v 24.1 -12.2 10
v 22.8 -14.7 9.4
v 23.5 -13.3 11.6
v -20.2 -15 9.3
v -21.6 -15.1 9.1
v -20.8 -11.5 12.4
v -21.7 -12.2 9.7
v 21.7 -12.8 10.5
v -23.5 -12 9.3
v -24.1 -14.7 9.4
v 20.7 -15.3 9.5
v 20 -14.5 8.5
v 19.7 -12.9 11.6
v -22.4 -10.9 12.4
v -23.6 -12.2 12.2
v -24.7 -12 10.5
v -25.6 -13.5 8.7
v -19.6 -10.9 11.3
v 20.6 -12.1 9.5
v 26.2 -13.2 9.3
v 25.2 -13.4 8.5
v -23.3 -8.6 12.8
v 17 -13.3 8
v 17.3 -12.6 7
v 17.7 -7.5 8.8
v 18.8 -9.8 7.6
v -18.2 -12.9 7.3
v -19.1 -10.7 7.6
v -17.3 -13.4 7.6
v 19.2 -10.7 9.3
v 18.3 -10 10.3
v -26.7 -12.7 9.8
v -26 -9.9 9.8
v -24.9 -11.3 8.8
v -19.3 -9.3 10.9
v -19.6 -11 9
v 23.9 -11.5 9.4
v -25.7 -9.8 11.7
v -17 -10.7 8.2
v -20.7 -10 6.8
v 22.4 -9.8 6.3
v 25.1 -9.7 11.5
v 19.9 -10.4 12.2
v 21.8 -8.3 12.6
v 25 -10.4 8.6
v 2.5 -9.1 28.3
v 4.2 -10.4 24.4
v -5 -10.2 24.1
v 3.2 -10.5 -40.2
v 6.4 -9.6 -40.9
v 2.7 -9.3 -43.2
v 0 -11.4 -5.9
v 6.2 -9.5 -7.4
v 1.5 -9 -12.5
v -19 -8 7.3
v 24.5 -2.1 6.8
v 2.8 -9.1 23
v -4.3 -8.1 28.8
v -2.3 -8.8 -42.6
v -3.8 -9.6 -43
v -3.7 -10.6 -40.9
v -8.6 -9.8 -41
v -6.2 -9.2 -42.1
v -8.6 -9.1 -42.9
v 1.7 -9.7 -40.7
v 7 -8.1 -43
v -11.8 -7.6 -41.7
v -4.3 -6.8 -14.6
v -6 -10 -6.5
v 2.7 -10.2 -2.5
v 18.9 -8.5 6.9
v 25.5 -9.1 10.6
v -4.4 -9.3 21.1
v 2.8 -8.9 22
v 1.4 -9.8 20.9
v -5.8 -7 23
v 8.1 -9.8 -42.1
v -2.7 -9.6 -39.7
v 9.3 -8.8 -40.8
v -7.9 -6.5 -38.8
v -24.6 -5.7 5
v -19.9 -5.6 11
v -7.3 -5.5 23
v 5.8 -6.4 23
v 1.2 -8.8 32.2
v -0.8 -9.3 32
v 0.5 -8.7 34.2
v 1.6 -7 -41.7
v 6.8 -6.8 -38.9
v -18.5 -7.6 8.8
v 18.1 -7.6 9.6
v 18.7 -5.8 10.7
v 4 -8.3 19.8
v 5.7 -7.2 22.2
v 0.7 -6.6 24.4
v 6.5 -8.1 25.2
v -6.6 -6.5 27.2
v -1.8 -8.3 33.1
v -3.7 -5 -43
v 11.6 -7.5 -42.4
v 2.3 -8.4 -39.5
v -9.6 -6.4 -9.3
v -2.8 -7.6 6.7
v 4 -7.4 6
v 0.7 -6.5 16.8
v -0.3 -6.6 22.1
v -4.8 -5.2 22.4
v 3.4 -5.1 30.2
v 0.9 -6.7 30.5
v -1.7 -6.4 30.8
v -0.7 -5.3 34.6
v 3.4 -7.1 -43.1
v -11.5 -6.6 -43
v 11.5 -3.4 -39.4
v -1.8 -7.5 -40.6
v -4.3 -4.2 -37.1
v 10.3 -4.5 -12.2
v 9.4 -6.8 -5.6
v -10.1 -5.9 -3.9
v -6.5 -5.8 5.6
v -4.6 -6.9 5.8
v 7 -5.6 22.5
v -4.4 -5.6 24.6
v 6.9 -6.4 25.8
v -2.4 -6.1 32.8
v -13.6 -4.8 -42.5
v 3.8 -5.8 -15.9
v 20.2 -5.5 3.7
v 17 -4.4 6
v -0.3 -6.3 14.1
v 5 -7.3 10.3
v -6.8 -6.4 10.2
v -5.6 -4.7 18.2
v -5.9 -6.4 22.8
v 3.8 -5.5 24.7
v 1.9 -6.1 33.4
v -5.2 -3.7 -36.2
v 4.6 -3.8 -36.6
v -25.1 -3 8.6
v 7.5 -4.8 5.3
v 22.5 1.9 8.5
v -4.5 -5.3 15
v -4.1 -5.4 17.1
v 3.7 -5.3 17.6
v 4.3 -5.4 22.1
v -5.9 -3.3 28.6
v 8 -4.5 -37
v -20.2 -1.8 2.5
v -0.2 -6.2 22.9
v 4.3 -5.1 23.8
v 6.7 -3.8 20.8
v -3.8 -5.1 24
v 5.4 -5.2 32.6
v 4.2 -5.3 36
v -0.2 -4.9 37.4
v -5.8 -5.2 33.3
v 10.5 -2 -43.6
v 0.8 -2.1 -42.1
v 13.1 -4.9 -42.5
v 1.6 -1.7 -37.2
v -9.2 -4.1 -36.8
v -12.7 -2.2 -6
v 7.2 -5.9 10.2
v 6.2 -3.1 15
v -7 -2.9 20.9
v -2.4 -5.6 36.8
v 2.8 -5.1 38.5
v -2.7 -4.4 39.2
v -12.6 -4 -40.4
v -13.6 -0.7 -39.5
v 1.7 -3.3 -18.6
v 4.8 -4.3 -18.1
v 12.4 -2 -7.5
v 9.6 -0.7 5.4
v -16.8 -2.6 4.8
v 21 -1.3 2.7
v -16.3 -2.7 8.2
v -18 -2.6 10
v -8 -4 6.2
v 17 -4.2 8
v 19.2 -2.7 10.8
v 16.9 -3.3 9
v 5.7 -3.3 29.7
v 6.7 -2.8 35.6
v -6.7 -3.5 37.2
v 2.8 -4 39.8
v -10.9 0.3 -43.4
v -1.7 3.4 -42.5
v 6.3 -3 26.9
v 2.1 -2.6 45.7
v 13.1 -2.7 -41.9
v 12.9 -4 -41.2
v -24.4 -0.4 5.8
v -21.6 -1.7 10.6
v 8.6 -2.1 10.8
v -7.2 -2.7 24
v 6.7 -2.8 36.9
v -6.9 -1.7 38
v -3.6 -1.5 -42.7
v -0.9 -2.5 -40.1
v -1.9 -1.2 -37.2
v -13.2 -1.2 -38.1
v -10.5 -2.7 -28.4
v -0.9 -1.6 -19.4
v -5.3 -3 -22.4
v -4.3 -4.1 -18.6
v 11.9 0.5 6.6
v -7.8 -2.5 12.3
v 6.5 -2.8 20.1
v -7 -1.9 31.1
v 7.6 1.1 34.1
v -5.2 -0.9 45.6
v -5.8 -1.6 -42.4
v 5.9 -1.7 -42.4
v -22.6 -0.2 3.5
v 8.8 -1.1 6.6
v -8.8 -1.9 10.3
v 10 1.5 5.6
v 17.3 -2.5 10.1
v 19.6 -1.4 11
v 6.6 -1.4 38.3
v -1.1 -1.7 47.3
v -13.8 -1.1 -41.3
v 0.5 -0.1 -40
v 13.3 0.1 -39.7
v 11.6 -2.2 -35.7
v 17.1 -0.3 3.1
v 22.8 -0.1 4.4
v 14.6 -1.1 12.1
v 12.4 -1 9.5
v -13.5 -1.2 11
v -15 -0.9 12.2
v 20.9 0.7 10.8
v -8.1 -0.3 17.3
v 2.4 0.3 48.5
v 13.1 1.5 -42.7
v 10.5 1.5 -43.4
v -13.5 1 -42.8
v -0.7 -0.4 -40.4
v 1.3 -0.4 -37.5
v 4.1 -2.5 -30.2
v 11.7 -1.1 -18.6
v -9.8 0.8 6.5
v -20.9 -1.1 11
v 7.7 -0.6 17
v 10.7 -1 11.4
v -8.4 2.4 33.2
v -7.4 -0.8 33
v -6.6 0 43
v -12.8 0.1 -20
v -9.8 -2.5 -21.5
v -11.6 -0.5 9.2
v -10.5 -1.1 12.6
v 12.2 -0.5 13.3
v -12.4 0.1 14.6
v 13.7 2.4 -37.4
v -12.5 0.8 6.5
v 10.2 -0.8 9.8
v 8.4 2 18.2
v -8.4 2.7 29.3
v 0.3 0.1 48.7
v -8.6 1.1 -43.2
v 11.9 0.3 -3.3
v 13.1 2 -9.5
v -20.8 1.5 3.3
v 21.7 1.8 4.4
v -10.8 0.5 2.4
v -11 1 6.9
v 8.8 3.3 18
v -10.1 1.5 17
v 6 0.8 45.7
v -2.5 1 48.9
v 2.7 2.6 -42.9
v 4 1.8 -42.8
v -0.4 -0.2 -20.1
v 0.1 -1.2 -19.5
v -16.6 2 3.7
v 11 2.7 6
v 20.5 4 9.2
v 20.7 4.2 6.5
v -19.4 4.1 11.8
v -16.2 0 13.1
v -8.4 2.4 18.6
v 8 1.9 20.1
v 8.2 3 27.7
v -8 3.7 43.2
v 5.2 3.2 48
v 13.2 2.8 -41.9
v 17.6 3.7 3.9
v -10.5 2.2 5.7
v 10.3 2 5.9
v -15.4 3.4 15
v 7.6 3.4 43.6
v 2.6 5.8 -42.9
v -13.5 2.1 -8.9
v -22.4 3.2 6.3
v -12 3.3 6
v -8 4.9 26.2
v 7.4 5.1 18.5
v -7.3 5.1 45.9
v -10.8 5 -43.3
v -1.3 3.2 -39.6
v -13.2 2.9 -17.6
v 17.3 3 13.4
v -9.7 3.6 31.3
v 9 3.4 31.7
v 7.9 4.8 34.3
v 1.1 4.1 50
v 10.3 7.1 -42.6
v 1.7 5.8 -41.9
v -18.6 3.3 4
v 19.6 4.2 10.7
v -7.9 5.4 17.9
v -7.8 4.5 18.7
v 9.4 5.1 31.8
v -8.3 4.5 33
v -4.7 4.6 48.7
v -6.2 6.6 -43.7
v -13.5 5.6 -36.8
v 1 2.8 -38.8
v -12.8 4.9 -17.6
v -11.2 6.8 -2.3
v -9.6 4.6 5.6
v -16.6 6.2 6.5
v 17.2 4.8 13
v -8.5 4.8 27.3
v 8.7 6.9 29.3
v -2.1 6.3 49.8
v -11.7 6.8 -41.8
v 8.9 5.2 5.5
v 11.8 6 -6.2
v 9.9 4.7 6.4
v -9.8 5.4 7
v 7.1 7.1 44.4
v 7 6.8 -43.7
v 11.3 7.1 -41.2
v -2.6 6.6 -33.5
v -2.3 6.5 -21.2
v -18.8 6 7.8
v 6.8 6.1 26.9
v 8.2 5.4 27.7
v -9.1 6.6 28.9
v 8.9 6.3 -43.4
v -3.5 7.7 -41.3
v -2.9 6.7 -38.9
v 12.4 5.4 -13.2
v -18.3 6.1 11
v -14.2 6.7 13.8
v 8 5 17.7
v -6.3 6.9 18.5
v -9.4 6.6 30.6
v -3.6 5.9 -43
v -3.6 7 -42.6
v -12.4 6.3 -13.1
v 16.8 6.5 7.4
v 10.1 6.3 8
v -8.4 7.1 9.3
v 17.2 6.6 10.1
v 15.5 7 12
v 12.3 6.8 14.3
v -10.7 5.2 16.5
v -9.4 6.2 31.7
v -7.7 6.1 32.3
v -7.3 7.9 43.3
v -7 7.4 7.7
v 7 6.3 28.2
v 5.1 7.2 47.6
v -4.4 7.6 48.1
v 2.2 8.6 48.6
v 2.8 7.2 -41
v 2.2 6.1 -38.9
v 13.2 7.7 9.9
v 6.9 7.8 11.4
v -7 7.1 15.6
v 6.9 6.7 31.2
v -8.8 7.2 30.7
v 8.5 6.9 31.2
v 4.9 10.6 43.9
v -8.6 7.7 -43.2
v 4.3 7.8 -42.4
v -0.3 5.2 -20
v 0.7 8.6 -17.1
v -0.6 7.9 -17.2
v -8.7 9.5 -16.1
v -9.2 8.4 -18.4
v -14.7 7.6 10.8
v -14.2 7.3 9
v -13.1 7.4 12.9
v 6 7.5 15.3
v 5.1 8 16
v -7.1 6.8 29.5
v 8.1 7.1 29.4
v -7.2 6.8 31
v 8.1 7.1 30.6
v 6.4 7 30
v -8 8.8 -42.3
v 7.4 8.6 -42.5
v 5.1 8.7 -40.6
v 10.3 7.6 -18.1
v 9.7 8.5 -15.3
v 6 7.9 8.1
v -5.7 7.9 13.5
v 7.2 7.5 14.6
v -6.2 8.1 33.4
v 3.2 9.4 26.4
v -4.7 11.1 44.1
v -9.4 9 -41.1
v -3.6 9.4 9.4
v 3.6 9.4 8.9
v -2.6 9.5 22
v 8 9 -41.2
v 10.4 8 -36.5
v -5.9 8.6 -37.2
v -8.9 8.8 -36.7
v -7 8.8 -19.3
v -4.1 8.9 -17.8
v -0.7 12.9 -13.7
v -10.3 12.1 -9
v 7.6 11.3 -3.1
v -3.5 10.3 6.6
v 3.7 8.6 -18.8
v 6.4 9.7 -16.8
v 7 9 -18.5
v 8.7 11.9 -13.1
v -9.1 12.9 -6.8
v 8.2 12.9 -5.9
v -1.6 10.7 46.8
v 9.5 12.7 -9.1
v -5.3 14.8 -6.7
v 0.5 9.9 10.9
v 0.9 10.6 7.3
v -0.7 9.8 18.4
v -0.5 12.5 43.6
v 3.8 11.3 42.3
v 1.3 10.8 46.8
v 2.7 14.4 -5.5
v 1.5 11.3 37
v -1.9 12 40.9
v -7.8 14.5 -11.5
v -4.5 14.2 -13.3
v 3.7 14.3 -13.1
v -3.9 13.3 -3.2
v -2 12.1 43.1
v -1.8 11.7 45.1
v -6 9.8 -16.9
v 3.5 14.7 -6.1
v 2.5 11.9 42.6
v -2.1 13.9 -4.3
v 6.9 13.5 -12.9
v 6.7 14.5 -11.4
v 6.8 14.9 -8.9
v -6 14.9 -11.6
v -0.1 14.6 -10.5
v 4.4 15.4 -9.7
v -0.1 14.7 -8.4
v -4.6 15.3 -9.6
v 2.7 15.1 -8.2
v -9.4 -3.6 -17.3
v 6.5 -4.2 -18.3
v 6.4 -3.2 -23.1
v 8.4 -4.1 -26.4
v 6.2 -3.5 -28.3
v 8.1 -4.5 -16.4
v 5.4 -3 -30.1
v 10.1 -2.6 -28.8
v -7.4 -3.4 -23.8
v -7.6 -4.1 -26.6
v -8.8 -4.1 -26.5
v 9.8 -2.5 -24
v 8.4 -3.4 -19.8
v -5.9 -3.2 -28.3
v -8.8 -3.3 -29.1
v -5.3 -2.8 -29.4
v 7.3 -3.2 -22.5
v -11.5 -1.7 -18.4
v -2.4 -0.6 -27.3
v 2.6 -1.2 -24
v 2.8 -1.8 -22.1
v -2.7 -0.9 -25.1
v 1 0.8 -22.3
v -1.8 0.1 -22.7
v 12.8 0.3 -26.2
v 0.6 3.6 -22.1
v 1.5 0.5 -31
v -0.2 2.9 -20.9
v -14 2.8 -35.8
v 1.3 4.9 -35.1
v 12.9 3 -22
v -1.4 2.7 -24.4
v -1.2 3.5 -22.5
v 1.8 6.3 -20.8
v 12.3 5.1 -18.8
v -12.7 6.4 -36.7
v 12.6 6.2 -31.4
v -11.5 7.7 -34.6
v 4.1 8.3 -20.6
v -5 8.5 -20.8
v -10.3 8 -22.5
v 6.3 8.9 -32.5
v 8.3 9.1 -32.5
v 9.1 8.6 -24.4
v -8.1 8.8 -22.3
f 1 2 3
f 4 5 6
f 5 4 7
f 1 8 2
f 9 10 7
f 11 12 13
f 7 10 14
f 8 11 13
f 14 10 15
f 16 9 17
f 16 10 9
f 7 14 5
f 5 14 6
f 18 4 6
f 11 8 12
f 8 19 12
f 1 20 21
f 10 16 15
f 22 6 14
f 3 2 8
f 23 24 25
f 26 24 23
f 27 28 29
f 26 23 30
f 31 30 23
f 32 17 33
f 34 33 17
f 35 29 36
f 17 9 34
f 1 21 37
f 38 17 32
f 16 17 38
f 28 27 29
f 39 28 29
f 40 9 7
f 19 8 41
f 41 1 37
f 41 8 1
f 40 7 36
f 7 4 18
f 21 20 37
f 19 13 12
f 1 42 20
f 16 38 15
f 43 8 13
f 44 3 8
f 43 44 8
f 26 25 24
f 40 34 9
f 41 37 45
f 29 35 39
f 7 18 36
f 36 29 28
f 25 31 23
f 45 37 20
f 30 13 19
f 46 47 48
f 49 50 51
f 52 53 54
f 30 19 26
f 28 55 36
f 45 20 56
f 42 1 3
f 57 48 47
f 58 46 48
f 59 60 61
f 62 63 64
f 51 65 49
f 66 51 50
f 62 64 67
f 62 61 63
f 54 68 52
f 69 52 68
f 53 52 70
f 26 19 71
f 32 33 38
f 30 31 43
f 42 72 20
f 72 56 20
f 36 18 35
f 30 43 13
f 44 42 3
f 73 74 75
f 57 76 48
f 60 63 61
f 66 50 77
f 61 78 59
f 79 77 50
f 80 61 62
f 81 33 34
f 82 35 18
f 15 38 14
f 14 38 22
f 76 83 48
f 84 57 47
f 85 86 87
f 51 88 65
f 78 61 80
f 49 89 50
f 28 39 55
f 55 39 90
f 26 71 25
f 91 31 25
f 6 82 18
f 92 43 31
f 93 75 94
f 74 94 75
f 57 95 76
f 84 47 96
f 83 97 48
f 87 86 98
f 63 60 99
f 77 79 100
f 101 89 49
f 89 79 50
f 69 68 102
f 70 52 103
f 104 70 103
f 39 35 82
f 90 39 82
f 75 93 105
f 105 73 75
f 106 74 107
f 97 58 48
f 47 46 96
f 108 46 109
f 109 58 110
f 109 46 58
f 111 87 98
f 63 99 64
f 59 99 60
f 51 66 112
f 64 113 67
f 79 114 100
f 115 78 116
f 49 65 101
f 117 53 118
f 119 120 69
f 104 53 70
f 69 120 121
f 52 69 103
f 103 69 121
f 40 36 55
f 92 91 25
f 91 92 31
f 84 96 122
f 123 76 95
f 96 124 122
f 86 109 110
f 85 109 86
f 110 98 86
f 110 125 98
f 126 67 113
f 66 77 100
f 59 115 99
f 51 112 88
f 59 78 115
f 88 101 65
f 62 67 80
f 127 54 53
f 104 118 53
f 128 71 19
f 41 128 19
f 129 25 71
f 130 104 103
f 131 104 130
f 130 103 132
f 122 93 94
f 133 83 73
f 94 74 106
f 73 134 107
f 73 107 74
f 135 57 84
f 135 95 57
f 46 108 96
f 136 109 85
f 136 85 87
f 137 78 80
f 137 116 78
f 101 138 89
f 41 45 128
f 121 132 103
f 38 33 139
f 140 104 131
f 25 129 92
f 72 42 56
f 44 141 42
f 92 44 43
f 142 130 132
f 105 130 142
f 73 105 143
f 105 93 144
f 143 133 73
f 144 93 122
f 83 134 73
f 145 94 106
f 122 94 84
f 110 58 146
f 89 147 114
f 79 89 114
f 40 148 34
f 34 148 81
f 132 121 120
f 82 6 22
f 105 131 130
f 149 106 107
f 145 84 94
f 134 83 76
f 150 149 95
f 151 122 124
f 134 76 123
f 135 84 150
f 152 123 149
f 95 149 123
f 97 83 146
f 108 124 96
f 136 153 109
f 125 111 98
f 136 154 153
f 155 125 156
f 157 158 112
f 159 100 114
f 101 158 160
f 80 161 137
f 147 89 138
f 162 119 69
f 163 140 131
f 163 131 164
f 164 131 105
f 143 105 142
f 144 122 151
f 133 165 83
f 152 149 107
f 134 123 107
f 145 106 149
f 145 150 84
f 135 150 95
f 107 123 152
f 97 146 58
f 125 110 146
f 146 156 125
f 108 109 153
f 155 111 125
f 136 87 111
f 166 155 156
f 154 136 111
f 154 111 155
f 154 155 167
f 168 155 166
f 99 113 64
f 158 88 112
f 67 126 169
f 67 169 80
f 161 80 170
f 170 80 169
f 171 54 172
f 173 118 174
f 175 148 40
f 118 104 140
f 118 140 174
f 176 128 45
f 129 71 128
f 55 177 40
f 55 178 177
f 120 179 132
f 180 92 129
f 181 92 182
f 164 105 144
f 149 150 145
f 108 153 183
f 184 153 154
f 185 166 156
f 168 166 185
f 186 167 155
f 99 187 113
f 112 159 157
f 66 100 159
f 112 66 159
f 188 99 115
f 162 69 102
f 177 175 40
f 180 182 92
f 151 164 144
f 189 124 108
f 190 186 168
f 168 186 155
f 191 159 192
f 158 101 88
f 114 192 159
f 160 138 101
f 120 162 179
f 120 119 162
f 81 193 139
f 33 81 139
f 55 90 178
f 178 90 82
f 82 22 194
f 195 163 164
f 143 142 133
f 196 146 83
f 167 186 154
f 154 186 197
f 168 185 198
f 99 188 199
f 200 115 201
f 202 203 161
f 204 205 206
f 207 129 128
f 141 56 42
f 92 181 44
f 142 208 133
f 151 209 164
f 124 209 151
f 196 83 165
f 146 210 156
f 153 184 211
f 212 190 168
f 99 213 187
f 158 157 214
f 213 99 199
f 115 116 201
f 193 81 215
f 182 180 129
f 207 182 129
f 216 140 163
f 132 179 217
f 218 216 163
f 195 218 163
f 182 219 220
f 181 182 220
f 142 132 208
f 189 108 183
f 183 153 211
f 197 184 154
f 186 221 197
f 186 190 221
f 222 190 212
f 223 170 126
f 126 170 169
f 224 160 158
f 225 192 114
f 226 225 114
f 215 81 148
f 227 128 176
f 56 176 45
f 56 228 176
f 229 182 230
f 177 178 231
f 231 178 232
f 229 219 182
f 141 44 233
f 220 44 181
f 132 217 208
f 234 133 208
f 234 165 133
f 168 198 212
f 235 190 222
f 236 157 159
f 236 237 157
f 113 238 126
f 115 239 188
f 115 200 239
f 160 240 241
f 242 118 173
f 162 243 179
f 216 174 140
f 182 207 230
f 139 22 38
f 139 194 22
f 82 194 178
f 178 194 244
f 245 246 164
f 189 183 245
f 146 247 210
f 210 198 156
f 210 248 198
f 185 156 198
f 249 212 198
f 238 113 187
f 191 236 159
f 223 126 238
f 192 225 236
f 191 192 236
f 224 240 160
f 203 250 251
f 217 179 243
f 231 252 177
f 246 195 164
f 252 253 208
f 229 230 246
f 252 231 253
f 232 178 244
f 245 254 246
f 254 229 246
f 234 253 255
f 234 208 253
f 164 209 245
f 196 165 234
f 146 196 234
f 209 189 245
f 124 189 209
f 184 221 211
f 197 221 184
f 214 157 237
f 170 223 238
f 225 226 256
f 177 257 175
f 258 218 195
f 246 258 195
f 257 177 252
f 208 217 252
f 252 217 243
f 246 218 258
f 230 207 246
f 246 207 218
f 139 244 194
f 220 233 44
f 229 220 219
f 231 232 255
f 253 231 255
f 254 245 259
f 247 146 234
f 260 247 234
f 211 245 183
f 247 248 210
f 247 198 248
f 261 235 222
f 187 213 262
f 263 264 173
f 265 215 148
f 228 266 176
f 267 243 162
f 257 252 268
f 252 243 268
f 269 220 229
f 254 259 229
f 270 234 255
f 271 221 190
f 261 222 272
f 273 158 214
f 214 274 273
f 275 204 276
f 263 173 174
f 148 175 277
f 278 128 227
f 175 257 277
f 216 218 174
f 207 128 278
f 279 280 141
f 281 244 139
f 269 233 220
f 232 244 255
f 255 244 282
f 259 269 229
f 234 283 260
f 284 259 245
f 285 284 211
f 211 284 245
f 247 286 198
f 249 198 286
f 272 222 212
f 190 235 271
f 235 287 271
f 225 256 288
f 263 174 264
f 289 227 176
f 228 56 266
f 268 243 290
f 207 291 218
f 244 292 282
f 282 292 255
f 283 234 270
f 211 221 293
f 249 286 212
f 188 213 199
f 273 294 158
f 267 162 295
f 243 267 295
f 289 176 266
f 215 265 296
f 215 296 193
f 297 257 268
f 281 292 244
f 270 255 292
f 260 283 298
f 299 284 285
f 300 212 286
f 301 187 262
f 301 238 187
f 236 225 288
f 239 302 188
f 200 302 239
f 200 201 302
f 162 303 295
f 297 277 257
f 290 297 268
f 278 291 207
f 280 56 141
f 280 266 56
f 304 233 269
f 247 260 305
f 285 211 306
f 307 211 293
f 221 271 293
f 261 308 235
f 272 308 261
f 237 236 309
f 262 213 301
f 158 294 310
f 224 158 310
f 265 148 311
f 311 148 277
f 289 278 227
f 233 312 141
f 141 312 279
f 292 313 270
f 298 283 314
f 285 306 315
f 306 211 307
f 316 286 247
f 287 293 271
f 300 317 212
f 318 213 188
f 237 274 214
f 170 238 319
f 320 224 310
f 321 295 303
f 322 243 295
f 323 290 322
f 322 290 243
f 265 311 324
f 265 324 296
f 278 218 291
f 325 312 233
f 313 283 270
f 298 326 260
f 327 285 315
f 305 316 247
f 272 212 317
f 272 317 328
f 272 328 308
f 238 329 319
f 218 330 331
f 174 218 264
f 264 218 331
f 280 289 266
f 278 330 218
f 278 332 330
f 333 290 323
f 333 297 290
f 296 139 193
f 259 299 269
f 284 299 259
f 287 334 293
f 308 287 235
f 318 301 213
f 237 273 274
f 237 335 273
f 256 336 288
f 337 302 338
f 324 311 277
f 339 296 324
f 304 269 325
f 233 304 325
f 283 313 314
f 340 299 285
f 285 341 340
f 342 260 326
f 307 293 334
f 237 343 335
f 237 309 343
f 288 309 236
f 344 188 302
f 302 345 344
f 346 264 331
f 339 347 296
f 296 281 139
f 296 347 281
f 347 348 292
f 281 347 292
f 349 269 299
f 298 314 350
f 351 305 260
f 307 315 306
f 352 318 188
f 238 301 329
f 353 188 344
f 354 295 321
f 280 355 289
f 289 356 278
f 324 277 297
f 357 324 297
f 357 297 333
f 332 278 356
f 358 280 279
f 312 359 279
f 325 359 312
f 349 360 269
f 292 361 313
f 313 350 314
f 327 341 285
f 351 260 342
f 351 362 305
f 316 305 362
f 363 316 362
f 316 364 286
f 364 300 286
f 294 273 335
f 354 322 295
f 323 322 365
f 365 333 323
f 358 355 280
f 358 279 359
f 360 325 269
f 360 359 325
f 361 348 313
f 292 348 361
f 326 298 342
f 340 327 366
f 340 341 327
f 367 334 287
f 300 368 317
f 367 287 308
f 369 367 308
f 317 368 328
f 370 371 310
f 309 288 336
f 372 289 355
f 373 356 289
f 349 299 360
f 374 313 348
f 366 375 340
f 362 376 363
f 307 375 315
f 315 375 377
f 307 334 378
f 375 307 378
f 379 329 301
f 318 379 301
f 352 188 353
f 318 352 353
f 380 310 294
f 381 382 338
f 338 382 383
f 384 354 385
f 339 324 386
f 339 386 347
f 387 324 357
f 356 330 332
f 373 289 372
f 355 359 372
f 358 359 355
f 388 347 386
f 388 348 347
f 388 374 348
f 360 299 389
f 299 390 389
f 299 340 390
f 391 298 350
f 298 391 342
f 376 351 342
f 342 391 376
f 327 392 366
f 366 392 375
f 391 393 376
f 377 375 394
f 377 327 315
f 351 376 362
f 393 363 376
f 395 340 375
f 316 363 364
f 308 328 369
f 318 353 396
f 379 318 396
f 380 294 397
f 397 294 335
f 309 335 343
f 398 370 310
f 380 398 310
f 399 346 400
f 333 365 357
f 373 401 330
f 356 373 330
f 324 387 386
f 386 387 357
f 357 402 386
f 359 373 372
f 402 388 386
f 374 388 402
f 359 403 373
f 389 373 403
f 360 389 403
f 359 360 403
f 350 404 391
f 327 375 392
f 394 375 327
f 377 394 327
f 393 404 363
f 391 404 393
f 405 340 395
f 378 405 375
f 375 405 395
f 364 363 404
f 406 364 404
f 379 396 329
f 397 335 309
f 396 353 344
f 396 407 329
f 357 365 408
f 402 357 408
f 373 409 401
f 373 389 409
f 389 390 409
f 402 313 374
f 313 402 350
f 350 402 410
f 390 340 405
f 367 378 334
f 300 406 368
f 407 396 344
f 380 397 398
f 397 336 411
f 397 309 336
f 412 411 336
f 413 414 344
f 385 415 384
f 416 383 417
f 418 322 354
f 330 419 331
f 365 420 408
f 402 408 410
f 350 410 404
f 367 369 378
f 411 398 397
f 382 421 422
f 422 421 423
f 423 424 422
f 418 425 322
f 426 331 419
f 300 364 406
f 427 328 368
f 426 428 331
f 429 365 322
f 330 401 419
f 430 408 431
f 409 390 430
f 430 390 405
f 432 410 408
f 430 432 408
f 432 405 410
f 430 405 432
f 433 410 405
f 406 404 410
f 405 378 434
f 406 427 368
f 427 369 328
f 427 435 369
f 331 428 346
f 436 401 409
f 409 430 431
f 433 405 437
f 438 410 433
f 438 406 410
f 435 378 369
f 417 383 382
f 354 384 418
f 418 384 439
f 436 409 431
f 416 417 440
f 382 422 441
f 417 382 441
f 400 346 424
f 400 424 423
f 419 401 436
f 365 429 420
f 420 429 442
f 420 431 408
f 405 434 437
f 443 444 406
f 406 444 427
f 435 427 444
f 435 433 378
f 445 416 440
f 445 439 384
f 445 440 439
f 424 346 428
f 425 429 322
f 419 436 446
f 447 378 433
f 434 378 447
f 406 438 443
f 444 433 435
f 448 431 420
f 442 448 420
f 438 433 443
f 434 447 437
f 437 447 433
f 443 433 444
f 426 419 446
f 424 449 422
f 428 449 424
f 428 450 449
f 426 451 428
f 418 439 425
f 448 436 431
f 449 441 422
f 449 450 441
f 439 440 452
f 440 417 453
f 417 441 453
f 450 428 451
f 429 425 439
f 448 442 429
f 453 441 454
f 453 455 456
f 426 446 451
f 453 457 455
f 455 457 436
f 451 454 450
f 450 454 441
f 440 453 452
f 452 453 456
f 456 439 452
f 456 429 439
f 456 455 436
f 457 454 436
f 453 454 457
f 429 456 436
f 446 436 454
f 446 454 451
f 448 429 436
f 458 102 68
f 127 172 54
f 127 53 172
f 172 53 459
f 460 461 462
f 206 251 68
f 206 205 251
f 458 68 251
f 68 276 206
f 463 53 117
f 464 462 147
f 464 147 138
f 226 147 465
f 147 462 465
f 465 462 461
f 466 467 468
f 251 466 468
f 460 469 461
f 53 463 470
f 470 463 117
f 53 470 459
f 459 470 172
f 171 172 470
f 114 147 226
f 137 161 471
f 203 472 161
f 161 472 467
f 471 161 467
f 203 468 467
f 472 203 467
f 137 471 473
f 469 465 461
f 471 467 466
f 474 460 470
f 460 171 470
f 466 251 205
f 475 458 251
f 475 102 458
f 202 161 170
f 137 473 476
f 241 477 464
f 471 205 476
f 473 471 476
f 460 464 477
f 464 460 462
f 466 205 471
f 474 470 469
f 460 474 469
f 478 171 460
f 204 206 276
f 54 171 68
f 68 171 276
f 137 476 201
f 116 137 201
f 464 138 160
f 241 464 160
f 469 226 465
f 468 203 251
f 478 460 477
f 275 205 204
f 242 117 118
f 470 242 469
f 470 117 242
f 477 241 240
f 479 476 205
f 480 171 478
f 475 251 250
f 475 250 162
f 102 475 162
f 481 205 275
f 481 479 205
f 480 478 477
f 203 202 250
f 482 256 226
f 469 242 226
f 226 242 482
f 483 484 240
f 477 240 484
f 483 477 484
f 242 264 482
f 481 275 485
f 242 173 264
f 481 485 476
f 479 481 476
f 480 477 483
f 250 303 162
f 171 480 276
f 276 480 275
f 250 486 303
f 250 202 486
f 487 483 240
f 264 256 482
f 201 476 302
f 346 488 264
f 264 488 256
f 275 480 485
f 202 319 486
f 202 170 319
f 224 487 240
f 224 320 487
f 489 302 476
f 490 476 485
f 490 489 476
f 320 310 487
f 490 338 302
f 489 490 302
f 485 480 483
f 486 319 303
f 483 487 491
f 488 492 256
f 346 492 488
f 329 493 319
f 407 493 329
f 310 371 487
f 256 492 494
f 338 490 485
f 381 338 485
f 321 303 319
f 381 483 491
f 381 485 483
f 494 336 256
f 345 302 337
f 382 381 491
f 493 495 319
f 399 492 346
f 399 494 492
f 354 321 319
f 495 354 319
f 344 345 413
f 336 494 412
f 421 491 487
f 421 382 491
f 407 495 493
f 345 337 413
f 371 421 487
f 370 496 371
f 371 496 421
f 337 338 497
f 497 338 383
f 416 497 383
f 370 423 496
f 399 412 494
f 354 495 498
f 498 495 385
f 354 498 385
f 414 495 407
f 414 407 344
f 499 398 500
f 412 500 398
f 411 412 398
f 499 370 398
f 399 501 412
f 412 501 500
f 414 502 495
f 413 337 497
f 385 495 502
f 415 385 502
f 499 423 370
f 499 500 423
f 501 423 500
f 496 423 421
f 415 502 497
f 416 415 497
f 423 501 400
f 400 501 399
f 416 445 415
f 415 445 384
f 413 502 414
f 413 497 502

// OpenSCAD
polyhedron(
  points = [
    [25.2,-13.4,8.5],
    [17.2,4.8,13.0],
    [-5.9,-3.2,-28.3],
    [-3.7,-10.6,-40.9],
    [-11.5,-6.6,-43.0],
    [-8.7,9.5,-16.1],
    [-12.4,6.3,-13.1],
    [5.7,-7.2,22.2],
    [20.5,4.0,9.2],
    [-0.8,-9.3,32.0],
    [-2.4,-5.6,36.8],
    [-18.0,-2.6,10.0],
    [-3.6,9.4,9.4],
    [-9.6,4.6,5.6],
    [2.7,-9.3,-43.2],
    [-7.8,4.5,18.7],
    [22.8,-14.7,9.4],
    [6.9,13.5,-12.9],
    [8.3,9.1,-32.5],
    [9.4,5.1,31.8],
    [1.6,-1.7,-37.2],
    [-13.5,1.0,-42.8],
    [2.8,-5.1,38.5],
    [21.8,-8.3,12.6],
    [-19.1,-10.7,7.6],
    [4.8,-4.3,-18.1],
    [8.8,3.3,18.0],
    [6.0,0.8,45.7],
    [-23.6,-12.2,12.2],
    [7.0,9.0,-18.5],
    [-5.8,-1.6,-42.4],
    [17.7,-7.5,8.8],
    [-8.6,1.1,-43.2],
    [-5.8,-5.2,33.3],
    [-4.5,14.2,-13.3],
    [-9.6,-6.4,-9.3],
    [1.7,5.8,-41.9],
    [9.7,8.5,-15.3],
    [10.4,8.0,-36.5],
    [0.7,8.6,-17.1],
    [-8.1,8.8,-22.3],
    [-0.7,12.9,-13.7],
    [-1.3,3.2,-39.6],
    [0.0,-11.4,-5.9],
    [-20.2,-1.8,2.5],
    [4.2,-5.3,36.0],
    [3.2,-10.5,-40.2],
    [1.6,-7.0,-41.7],
    [0.8,-2.1,-42.1],
    [-25.7,-9.8,11.7],
    [17.0,-13.3,8.0],
    [0.7,-6.6,24.4],
    [-25.6,-13.5,8.7],
    [6.7,14.5,-11.4],
    [2.1,-2.6,45.7],
    [20.2,-5.5,3.7],
    [10.3,7.1,-42.6],
    [1.4,-9.8,20.9],
    [-8.8,-1.9,10.3],
    [19.6,-1.4,11.0],
    [9.6,-0.7,5.4],
    [-13.2,2.9,-17.6],
    [8.0,-4.5,-37.0],
    [-18.3,6.1,11.0],
    [-3.5,7.7,-41.3],
    [6.9,7.8,11.4],
    [-5.6,-4.7,18.2],
    [13.3,0.1,-39.7],
    [-24.4,-0.4,5.8],
    [-11.5,7.7,-34.6],
    [-24.1,-14.7,9.4],
    [8.2,3.0,27.7],
    [3.6,9.4,8.9],
    [13.1,-4.9,-42.5],
    [-2.4,-0.6,-27.3],
    [-8.4,2.4,18.6],
    [-12.6,-4.0,-40.4],
    [6.2,-3.5,-28.3],
    [-16.6,6.2,6.5],
    [5.4,-5.2,32.6],
    [-4.4,-9.3,21.1],
    [-7.4,-3.4,-23.8],
    [6.4,-3.2,-23.1],
    [-26.0,-9.9,9.8],
    [-1.2,3.5,-22.5],
    [13.1,2.0,-9.5],
    [12.4,5.4,-13.2],
    [3.8,11.3,42.3],
    [7.4,8.6,-42.5],
    [10.3,2.0,5.9],
    [-2.6,6.6,-33.5],
    [-7.0,8.8,-19.3],
    [20.6,-12.1,9.5],
    [-18.5,-7.6,8.8],
    [8.4,-3.4,-19.8],
    [2.6,5.8,-42.9],
    [-1.7,-6.4,30.8],
    [6.2,-3.1,15.0],
    [12.9,-4.0,-41.2],
    [4.0,-8.3,19.8],
    [7.0,6.3,28.2],
    [7.7,-0.6,17.0],
    [6.5,-8.1,25.2],
    [-4.4,-5.6,24.6],
    [-5.9,-3.3,28.6],
    [-7.8,14.5,-11.5],
    [-16.3,-2.7,8.2],
    [-7.3,-5.5,23.0],
    [24.1,-12.2,10.0],
    [-9.8,-2.5,-21.5],
    [8.7,6.9,29.3],
    [-19.6,-11.0,9.0],
    [2.8,-8.9,22.0],
    [0.5,-8.7,34.2],
    [11.0,2.7,6.0],
    [6.8,14.9,-8.9],
    [-20.2,-15.0,9.3],
    [2.8,7.2,-41.0],
    [23.9,-11.5,9.4],
    [9.8,-2.5,-24.0],
    [-11.8,-7.6,-41.7],
    [-4.1,-5.4,17.1],
    [-6.9,-1.7,38.0],
    [1.2,-8.8,32.2],
    [-6.0,-10.0,-6.5],
    [4.0,1.8,-42.8],
    [-5.9,-6.4,22.8],
    [4.0,-7.4,6.0],
    [21.7,-12.8,10.5],
    [22.8,-0.1,4.4],
    [-5.3,14.8,-6.7],
    [12.4,-1.0,9.5],
    [-20.9,-1.1,11.0],
    [3.8,-5.8,-15.9],
    [12.2,-0.5,13.3],
    [-0.4,-0.2,-20.1],
    [-9.7,3.6,31.3],
    [-16.8,-2.6,4.8],
    [8.0,5.0,17.7],
    [20.0,-14.5,8.5],
    [20.7,-15.3,9.5],
    [-21.6,-15.1,9.1],
    [-19.6,-10.9,11.3],
    [23.5,-13.3,11.6],
    [26.2,-13.2,9.3],
    [17.3,-12.6,7.0],
    [-24.7,-12.0,10.5],
    [-22.4,-10.9,12.4],
    [-17.3,-13.4,7.6],
    [-26.7,-12.7,9.8],
    [-18.2,-12.9,7.3],
    [-17.0,-10.7,8.2],
    [-23.5,-12.0,9.3],
    [19.2,-10.7,9.3],
    [18.3,-10.0,10.3],
    [-24.9,-11.3,8.8],
    [-21.7,-12.2,9.7],
    [19.7,-12.9,11.6],
    [-3.8,-9.6,-43.0],
    [2.7,-10.2,-2.5],
    [18.8,-9.8,7.6],
    [-19.3,-9.3,10.9],
    [-20.8,-11.5,12.4],
    [19.9,-10.4,12.2],
    [2.5,-9.1,28.3],
    [8.1,-9.8,-42.1],
    [6.4,-9.6,-40.9],
    [-19.0,-8.0,7.3],
    [2.8,-9.1,23.0],
    [-4.3,-8.1,28.8],
    [-8.6,-9.1,-42.9],
    [-8.6,-9.8,-41.0],
    [-6.2,-9.2,-42.1],
    [1.7,-9.7,-40.7],
    [-2.7,-9.6,-39.7],
    [9.3,-8.8,-40.8],
    [1.5,-9.0,-12.5],
    [22.4,-9.8,6.3],
    [18.9,-8.5,6.9],
    [25.5,-9.1,10.6],
    [-23.3,-8.6,12.8],
    [7.0,-8.1,-43.0],
    [-19.9,-5.6,11.0],
    [4.2,-10.4,24.4],
    [25.0,-10.4,8.6],
    [18.7,-5.8,10.7],
    [-6.6,-6.5,27.2],
    [-5.0,-10.2,24.1],
    [-1.8,-8.3,33.1],
    [-4.3,-6.8,-14.6],
    [-6.5,-5.8,5.6],
    [-2.8,-7.6,6.7],
    [18.1,-7.6,9.6],
    [-3.7,-5.0,-43.0],
    [-2.3,-8.8,-42.6],
    [3.4,-7.1,-43.1],
    [-10.1,-5.9,-3.9],
    [-4.6,-6.9,5.8],
    [-20.7,-10.0,6.8],
    [24.5,-2.1,6.8],
    [5.0,-7.3,10.3],
    [-6.8,-6.4,10.2],
    [7.0,-5.6,22.5],
    [-5.2,-3.7,-36.2],
    [6.2,-9.5,-7.4],
    [7.2,-5.9,10.2],
    [25.1,-9.7,11.5],
    [-0.3,-6.3,14.1],
    [4.3,-5.4,22.1],
    [-4.8,-5.2,22.4],
    [1.9,-6.1,33.4],
    [11.6,-7.5,-42.4],
    [11.5,-3.4,-39.4],
    [4.6,-3.8,-36.6],
    [6.8,-6.8,-38.9],
    [0.7,-6.5,16.8],
    [-4.5,-5.3,15.0],
    [5.8,-6.4,23.0],
    [-5.8,-7.0,23.0],
    [-2.4,-6.1,32.8],
    [-0.9,-2.5,-40.1],
    [-7.9,-6.5,-38.8],
    [2.3,-8.4,-39.5],
    [-24.6,-5.7,5.0],
    [3.7,-5.3,17.6],
    [-0.3,-6.6,22.1],
    [-0.2,-6.2,22.9],
    [4.3,-5.1,23.8],
    [3.8,-5.5,24.7],
    [6.9,-6.4,25.8],
    [0.9,-6.7,30.5],
    [-1.8,-7.5,-40.6],
    [10.3,-4.5,-12.2],
    [-7.0,-2.9,20.9],
    [-3.8,-5.1,24.0],
    [3.4,-5.1,30.2],
    [-0.7,-5.3,34.6],
    [-2.7,-4.4,39.2],
    [-0.2,-4.9,37.4],
    [-4.3,-4.2,-37.1],
    [9.4,-6.8,-5.6],
    [21.0,-1.3,2.7],
    [-8.0,-4.0,6.2],
    [17.0,-4.2,8.0],
    [6.7,-3.8,20.8],
    [-6.7,-3.5,37.2],
    [6.7,-2.8,35.6],
    [5.9,-1.7,-42.4],
    [7.5,-4.8,5.3],
    [5.7,-3.3,29.7],
    [2.8,-4.0,39.8],
    [10.5,-2.0,-43.6],
    [13.1,-2.7,-41.9],
    [10.1,-2.6,-28.8],
    [-9.2,-4.1,-36.8],
    [8.4,-4.1,-26.4],
    [-5.3,-3.0,-22.4],
    [-21.6,-1.7,10.6],
    [8.6,-2.1,10.8],
    [-7.2,-2.7,24.0],
    [6.7,-2.8,36.9],
    [-10.9,0.3,-43.4],
    [7.3,-3.2,-22.5],
    [-12.7,-2.2,-6.0],
    [17.0,-4.4,6.0],
    [16.9,-3.3,9.0],
    [17.3,-2.5,10.1],
    [22.5,1.9,8.5],
    [19.2,-2.7,10.8],
    [6.5,-2.8,20.1],
    [-7.0,-1.9,31.1],
    [-3.6,-1.5,-42.7],
    [0.5,-0.1,-40.0],
    [4.1,-2.5,-30.2],
    [-1.1,-1.7,47.3],
    [-13.6,-0.7,-39.5],
    [-25.1,-3.0,8.6],
    [-7.8,-2.5,12.3],
    [-8.1,-0.3,17.3],
    [2.4,0.3,48.5],
    [-13.6,-4.8,-42.5],
    [-0.7,-0.4,-40.4],
    [-10.5,-2.7,-28.4],
    [11.7,-1.1,-18.6],
    [12.4,-2.0,-7.5],
    [17.1,-0.3,3.1],
    [-15.0,-0.9,12.2],
    [14.6,-1.1,12.1],
    [-10.5,-1.1,12.6],
    [-7.4,-0.8,33.0],
    [6.6,-1.4,38.3],
    [-13.8,-1.1,-41.3],
    [1.3,-0.4,-37.5],
    [2.8,-1.8,-22.1],
    [-0.9,-1.6,-19.4],
    [-13.5,2.1,-8.9],
    [10.0,1.5,5.6],
    [10.7,-1.0,11.4],
    [-13.5,-1.2,11.0],
    [-12.4,0.1,14.6],
    [6.3,-3.0,26.9],
    [-2.5,1.0,48.9],
    [13.1,1.5,-42.7],
    [-1.9,-1.2,-37.2],
    [10.2,-0.8,9.8],
    [11.9,0.5,6.6],
    [-11.6,-0.5,9.2],
    [-10.8,0.5,2.4],
    [-9.8,0.8,6.5],
    [-5.2,-0.9,45.6],
    [2.7,2.6,-42.9],
    [0.6,3.6,-22.1],
    [8.8,-1.1,6.6],
    [-12.5,0.8,6.5],
    [20.9,0.7,10.8],
    [-16.2,-0.0,13.1],
    [8.4,2.0,18.2],
    [8.0,1.9,20.1],
    [-6.6,0.0,43.0],
    [10.5,1.5,-43.4],
    [11.9,0.3,-3.3],
    [-20.8,1.5,3.3],
    [-11.0,1.0,6.9],
    [7.6,1.1,34.1],
    [-22.6,-0.2,3.5],
    [-22.4,3.2,6.3],
    [-12.0,3.3,6.0],
    [-19.4,4.1,11.8],
    [-10.1,1.5,17.0],
    [-8.4,2.7,29.3],
    [-8.4,2.4,33.2],
    [5.2,3.2,48.0],
    [0.3,0.1,48.7],
    [13.2,2.8,-41.9],
    [-11.2,6.8,-2.3],
    [-10.5,2.2,5.7],
    [-8.0,4.9,26.2],
    [-10.8,5.0,-43.3],
    [17.6,3.7,3.9],
    [19.6,4.2,10.7],
    [-7.9,5.4,17.9],
    [9.0,3.4,31.7],
    [7.6,3.4,43.6],
    [-4.7,4.6,48.7],
    [1.0,2.8,-38.8],
    [-0.2,2.9,-20.9],
    [11.8,6.0,-6.2],
    [21.7,1.8,4.4],
    [17.3,3.0,13.4],
    [-15.4,3.4,15.0],
    [-8.0,3.7,43.2],
    [-2.1,6.3,49.8],
    [-13.5,5.6,-36.8],
    [-18.6,3.3,4.0],
    [-9.8,5.4,7.0],
    [7.4,5.1,18.5],
    [-16.6,2.0,3.7],
    [-18.8,6.0,7.8],
    [20.7,4.2,6.5],
    [-8.5,4.8,27.3],
    [-9.1,6.6,28.9],
    [-8.3,4.5,33.0],
    [7.9,4.8,34.3],
    [1.1,4.1,50.0],
    [-2.9,6.7,-38.9],
    [-12.8,4.9,-17.6],
    [9.9,4.7,6.4],
    [8.2,5.4,27.7],
    [-3.6,5.9,-43.0],
    [-1.7,3.4,-42.5],
    [1.8,6.3,-20.8],
    [16.8,6.5,7.4],
    [8.9,5.2,5.5],
    [10.1,6.3,8.0],
    [17.2,6.6,10.1],
    [15.5,7.0,12.0],
    [12.3,6.8,14.3],
    [-10.7,5.2,16.5],
    [-9.4,6.2,31.7],
    [7.1,7.1,44.4],
    [5.1,7.2,47.6],
    [-6.2,6.6,-43.7],
    [7.0,6.8,-43.7],
    [-11.7,6.8,-41.8],
    [-9.4,9.0,-41.1],
    [-2.3,6.5,-21.2],
    [-7.0,7.4,7.7],
    [-14.2,6.7,13.8],
    [6.0,7.5,15.3],
    [6.8,6.1,26.9],
    [8.5,6.9,31.2],
    [-7.7,6.1,32.3],
    [-4.4,7.6,48.1],
    [2.2,6.1,-38.9],
    [-0.6,7.9,-17.2],
    [-7.0,7.1,15.6],
    [-9.4,6.6,30.6],
    [-7.2,6.8,31.0],
    [-8.8,7.2,30.7],
    [-7.3,5.1,45.9],
    [8.9,6.3,-43.4],
    [-8.6,7.7,-43.2],
    [4.3,7.8,-42.4],
    [-9.2,8.4,-18.4],
    [-14.2,7.3,9.0],
    [-6.3,6.9,18.5],
    [-7.1,6.8,29.5],
    [8.1,7.1,29.4],
    [6.9,6.7,31.2],
    [8.1,7.1,30.6],
    [6.4,7.0,30.0],
    [-3.6,7.0,-42.6],
    [11.3,7.1,-41.2],
    [-5.0,8.5,-20.8],
    [-4.1,8.9,-17.8],
    [10.3,7.6,-18.1],
    [13.2,7.7,9.9],
    [-13.1,7.4,12.9],
    [-8.4,7.1,9.3],
    [-14.7,7.6,10.8],
    [-5.7,7.9,13.5],
    [7.2,7.5,14.6],
    [-6.2,8.1,33.4],
    [-7.3,7.9,43.3],
    [-8.0,8.8,-42.3],
    [5.1,8.0,16.0],
    [8.0,9.0,-41.2],
    [5.1,8.7,-40.6],
    [-8.9,8.8,-36.7],
    [-3.5,10.3,6.6],
    [2.2,8.6,48.6],
    [3.7,8.6,-18.8],
    [8.7,11.9,-13.1],
    [8.2,12.9,-5.9],
    [-2.6,9.5,22.0],
    [-1.6,10.7,46.8],
    [-6.0,9.8,-16.9],
    [7.6,11.3,-3.1],
    [6.0,7.9,8.1],
    [0.5,9.9,10.9],
    [-0.7,9.8,18.4],
    [3.2,9.4,26.4],
    [-4.7,11.1,44.1],
    [4.9,10.6,43.9],
    [-2.0,12.1,43.1],
    [1.3,10.8,46.8],
    [6.4,9.7,-16.8],
    [-9.1,12.9,-6.8],
    [0.9,10.6,7.3],
    [-1.9,12.0,40.9],
    [-1.8,11.7,45.1],
    [-0.5,12.5,43.6],
    [3.7,14.3,-13.1],
    [1.5,11.3,37.0],
    [2.5,11.9,42.6],
    [-10.3,12.1,-9.0],
    [-2.1,13.9,-4.3],
    [9.5,12.7,-9.1],
    [-3.9,13.3,-3.2],
    [3.5,14.7,-6.1],
    [-6.0,14.9,-11.6],
    [2.7,15.1,-8.2],
    [-0.1,14.7,-8.4],
    [-4.6,15.3,-9.6],
    [-0.1,14.6,-10.5],
    [4.4,15.4,-9.7],
    [2.7,14.4,-5.5],
    [-4.3,-4.1,-18.6],
    [6.5,-4.2,-18.3],
    [-9.4,-3.6,-17.3],
    [8.1,-4.5,-16.4],
    [5.4,-3.0,-30.1],
    [11.6,-2.2,-35.7],
    [1.7,-3.3,-18.6],
    [-7.6,-4.1,-26.6],
    [-8.8,-3.3,-29.1],
    [-8.8,-4.1,-26.5],
    [2.6,-1.2,-24.0],
    [-5.3,-2.8,-29.4],
    [0.1,-1.2,-19.5],
    [-2.7,-0.9,-25.1],
    [-11.5,-1.7,-18.4],
    [12.8,0.3,-26.2],
    [1.5,0.5,-31.0],
    [-1.8,0.1,-22.7],
    [-12.8,0.1,-20.0],
    [1.0,0.8,-22.3],
    [-14.0,2.8,-35.8],
    [13.7,2.4,-37.4],
    [-13.2,-1.2,-38.1],
    [12.9,3.0,-22.0],
    [1.3,4.9,-35.1],
    [-1.4,2.7,-24.4],
    [-12.7,6.4,-36.7],
    [12.3,5.1,-18.8],
    [-0.3,5.2,-20.0],
    [12.6,6.2,-31.4],
    [4.1,8.3,-20.6],
    [-5.9,8.6,-37.2],
    [-10.3,8.0,-22.5],
    [6.3,8.9,-32.5],
    [9.1,8.6,-24.4]
  ],
  faces = [[143,16,108], [162,141,116], [156,116,141], [16,128,108], [156,70,152], [157,139,140], [147,70,156], [157,140,128], [28,70,147], [52,152,146], [152,70,146], [141,147,156], [162,147,141], [162,116,142], [139,128,140], [139,92,128], [0,144,108], [28,146,70], [147,162,180], [128,16,143], [31,145,50], [50,145,160], [148,24,150], [153,50,160], [50,153,154], [83,52,149], [52,83,155], [111,148,161], [155,152,52], [118,0,108], [149,52,49], [49,52,146], [148,150,24], [148,24,151], [156,152,198], [177,128,92], [118,108,177], [108,128,177], [111,156,198], [142,116,156], [118,144,0], [139,157,92], [144,206,108], [28,49,146], [157,128,163], [128,143,23], [128,23,163], [145,31,160], [152,155,198], [184,118,177], [151,161,148], [111,142,156], [24,148,111], [50,154,31], [144,118,184], [92,157,153], [187,183,164], [14,166,46], [176,204,43], [160,92,153], [111,167,24], [199,144,184], [143,108,206], [183,187,168], [187,164,169], [3,158,194], [170,172,171], [46,173,14], [166,14,181], [120,170,171], [172,3,171], [43,189,176], [189,43,124], [159,43,204], [178,92,160], [49,83,149], [163,154,153], [144,179,206], [144,199,179], [161,142,111], [157,163,153], [143,206,23], [57,112,80], [187,218,168], [3,172,158], [165,166,181], [194,174,3], [166,165,175], [171,3,221], [155,83,223], [142,161,182], [147,49,28], [180,49,147], [187,107,218], [183,168,217], [113,9,123], [173,47,14], [221,3,174], [166,214,46], [167,151,24], [93,151,167], [31,178,160], [31,154,192], [142,182,162], [154,163,185], [7,57,99], [57,7,112], [218,51,168], [102,183,217], [187,186,107], [188,9,113], [193,158,172], [211,175,165], [46,214,222], [166,175,214], [35,189,124], [191,43,159], [191,159,127], [182,161,151], [182,151,93], [215,99,57], [57,80,215], [209,112,225], [187,169,186], [102,164,183], [230,164,235], [96,169,230], [169,164,230], [188,113,236], [170,193,172], [158,193,194], [195,181,14], [120,4,170], [211,212,175], [239,174,231], [222,173,46], [240,204,232], [124,190,196], [159,204,127], [197,190,124], [191,124,43], [197,124,191], [167,111,198], [31,192,185], [154,185,192], [202,102,217], [51,218,103], [202,229,102], [96,230,9], [9,230,123], [9,188,96], [188,219,96], [4,120,280], [211,165,181], [193,231,194], [47,195,14], [231,174,194], [173,222,47], [221,120,171], [204,176,133], [204,240,127], [92,178,55], [92,55,177], [178,31,264], [191,127,207], [207,127,200], [201,191,207], [7,99,202], [80,107,66], [225,112,7], [209,126,80], [112,209,80], [217,168,228], [168,51,228], [102,235,164], [123,230,210], [113,123,210], [221,174,203], [174,239,203], [214,213,222], [55,184,177], [191,201,197], [276,83,49], [200,127,248], [185,264,31], [199,206,179], [206,267,23], [163,23,185], [201,207,216], [216,207,215], [121,215,80], [224,99,215], [80,66,121], [202,99,224], [80,126,107], [225,7,208], [217,7,202], [104,169,96], [212,62,214], [212,214,175], [155,44,198], [223,44,155], [190,197,201], [180,162,182], [207,200,215], [209,225,226], [7,217,208], [218,107,126], [51,226,227], [229,202,244], [103,218,126], [227,217,228], [226,103,234], [103,226,51], [104,107,186], [102,229,235], [230,79,210], [188,236,219], [79,45,210], [33,219,238], [195,48,251], [212,211,73], [20,48,222], [203,254,221], [213,214,62], [124,196,263], [200,248,205], [97,200,205], [215,200,97], [216,215,121], [244,202,224], [107,233,66], [209,226,234], [209,103,126], [226,225,208], [217,227,208], [51,227,228], [234,103,209], [169,104,186], [104,96,219], [219,33,104], [79,230,235], [219,236,238], [236,113,210], [33,238,10], [236,210,45], [238,236,45], [22,238,45], [10,238,237], [170,4,193], [195,47,48], [76,280,120], [221,76,120], [275,221,254], [76,221,275], [25,176,473], [60,240,284], [198,44,137], [248,127,240], [60,248,240], [184,55,241], [55,178,264], [198,106,167], [106,11,167], [201,242,190], [264,185,243], [265,185,268], [224,215,97], [208,227,226], [249,79,235], [45,79,246], [33,10,245], [245,10,237], [238,22,250], [4,261,193], [251,73,195], [73,211,181], [73,181,195], [231,193,369], [35,124,263], [198,137,106], [185,265,243], [224,97,244], [235,229,300], [237,250,54], [238,250,237], [98,73,252], [47,222,48], [73,98,212], [222,213,20], [242,263,190], [263,196,190], [276,68,223], [276,223,83], [11,93,167], [182,93,11], [257,180,182], [97,205,258], [66,216,121], [107,104,259], [45,250,22], [260,250,45], [122,245,237], [271,369,193], [303,231,220], [254,282,489], [467,256,294], [55,264,305], [206,199,267], [23,268,185], [66,277,216], [97,269,244], [244,269,229], [233,107,259], [33,270,104], [323,246,79], [237,54,309], [261,30,193], [247,251,48], [271,193,30], [303,239,231], [324,223,68], [264,243,265], [264,265,305], [205,248,312], [58,242,201], [205,312,296], [205,296,258], [59,266,265], [59,265,268], [277,201,216], [249,235,300], [323,79,249], [45,246,260], [260,290,250], [290,54,250], [309,54,274], [280,275,291], [76,275,280], [48,20,272], [212,98,67], [212,67,472], [44,223,324], [241,55,285], [184,241,199], [241,129,199], [131,265,287], [298,11,106], [286,11,298], [265,266,287], [314,23,267], [268,23,59], [277,58,201], [277,66,278], [66,233,278], [309,122,237], [274,54,279], [73,251,302], [251,319,302], [280,21,4], [369,281,231], [281,220,231], [273,292,20], [284,240,283], [242,308,263], [248,60,312], [131,305,265], [49,180,276], [180,257,276], [11,257,182], [132,257,11], [97,297,101], [101,249,300], [270,330,104], [33,122,270], [122,289,270], [122,33,245], [122,309,318], [261,4,21], [73,302,252], [21,280,291], [302,67,98], [302,98,252], [20,292,272], [109,485,282], [308,242,58], [106,306,298], [97,258,297], [277,288,306], [297,131,287], [288,298,306], [132,11,286], [297,134,101], [297,287,134], [299,288,278], [288,277,278], [101,269,97], [278,233,259], [278,259,104], [101,300,269], [269,300,229], [323,290,246], [246,290,260], [319,251,247], [21,291,275], [488,472,67], [137,313,106], [258,296,304], [258,304,297], [306,106,313], [306,58,277], [308,58,306], [304,296,297], [297,305,131], [296,305,297], [257,132,276], [23,314,59], [266,59,287], [299,286,298], [299,298,288], [316,101,134], [278,104,330], [278,330,329], [249,101,323], [270,289,330], [289,122,330], [274,279,332], [32,30,261], [284,85,320], [44,324,321], [241,347,129], [263,308,307], [322,306,313], [322,308,306], [287,59,26], [287,316,134], [299,278,328], [54,290,27], [301,274,332], [247,48,310], [310,125,247], [479,294,135], [60,284,320], [356,137,44], [285,55,114], [356,313,137], [60,296,312], [114,55,305], [267,358,8], [276,132,327], [59,314,26], [299,132,286], [315,132,299], [287,26,316], [329,75,278], [101,316,317], [323,317,71], [101,317,323], [122,350,330], [350,122,318], [309,274,301], [27,279,54], [27,331,279], [333,488,67], [85,60,320], [241,285,338], [347,199,129], [335,308,322], [296,89,305], [315,349,132], [299,349,315], [328,278,75], [342,290,323], [309,350,318], [271,30,369], [48,95,310], [295,263,307], [295,307,308], [347,241,338], [325,321,324], [68,325,324], [322,313,326], [132,349,327], [349,299,328], [336,75,329], [71,317,355], [350,309,399], [32,261,337], [261,21,337], [333,67,302], [369,42,281], [281,42,220], [42,303,220], [295,61,263], [313,356,326], [322,326,335], [305,89,114], [267,199,358], [199,347,358], [26,314,348], [136,329,330], [341,323,71], [342,323,362], [342,27,290], [279,363,332], [332,363,301], [56,302,319], [337,30,32], [36,95,48], [36,48,272], [353,44,321], [356,44,353], [285,114,338], [267,339,314], [8,339,267], [328,340,349], [15,75,336], [19,341,71], [362,323,341], [330,350,361], [27,342,331], [309,343,399], [369,30,381], [247,125,319], [352,21,275], [36,272,344], [61,295,365], [295,308,334], [334,335,13], [308,335,334], [78,353,321], [325,78,321], [89,296,114], [314,339,1], [328,75,340], [329,359,336], [19,71,110], [330,361,136], [343,309,301], [351,343,301], [363,351,301], [352,383,21], [346,372,296], [85,296,60], [346,296,85], [347,338,358], [296,372,114], [372,366,114], [13,335,354], [335,326,354], [68,276,325], [26,355,316], [316,355,317], [342,379,331], [279,331,363], [30,337,381], [125,310,319], [310,382,319], [333,412,488], [385,42,90], [356,353,78], [78,325,357], [1,26,348], [1,348,314], [15,340,75], [71,355,389], [389,367,71], [359,329,360], [379,342,362], [382,400,319], [400,56,319], [302,56,333], [42,369,64], [64,364,42], [346,85,86], [325,63,357], [276,327,325], [327,63,325], [349,387,63], [349,63,327], [355,26,138], [405,15,336], [329,136,396], [341,19,362], [369,381,368], [383,337,21], [64,369,411], [365,295,6], [338,371,358], [114,373,338], [326,356,78], [326,78,418], [354,326,418], [373,114,366], [8,358,374], [8,375,339], [339,375,1], [26,376,138], [340,377,349], [15,405,340], [71,367,110], [360,329,396], [136,378,396], [378,136,361], [378,361,391], [350,423,361], [350,399,423], [382,310,95], [295,334,6], [386,334,13], [13,354,386], [358,371,374], [375,8,374], [26,1,376], [1,375,376], [340,387,377], [377,387,349], [360,336,359], [100,110,389], [110,367,389], [331,379,380], [343,392,399], [363,331,380], [363,380,430], [351,392,343], [36,393,117], [412,333,56], [371,338,416], [338,373,65], [376,355,138], [387,340,395], [389,408,100], [391,398,378], [19,408,362], [390,408,19], [443,379,362], [443,362,408], [337,383,401], [337,401,381], [411,369,368], [411,368,381], [95,36,402], [385,39,495], [394,39,385], [403,6,5], [419,78,357], [63,419,357], [418,78,404], [366,372,373], [416,338,65], [416,375,371], [371,375,374], [419,63,417], [63,387,417], [387,395,417], [388,355,376], [388,425,355], [425,389,355], [405,336,406], [360,406,336], [360,396,398], [398,406,360], [100,407,110], [408,407,100], [398,397,406], [409,408,390], [19,110,390], [378,398,396], [398,391,397], [408,389,410], [423,391,361], [430,351,363], [424,411,381], [424,381,401], [88,95,402], [382,95,88], [400,382,56], [36,117,427], [36,427,402], [37,86,415], [418,386,354], [372,438,65], [372,65,373], [419,404,78], [418,404,419], [419,420,418], [416,65,375], [419,417,420], [420,417,395], [65,421,375], [421,65,388], [421,388,376], [421,376,375], [406,422,405], [407,408,110], [110,408,409], [110,409,390], [391,422,397], [397,422,406], [410,389,441], [408,441,443], [410,441,408], [422,391,423], [422,423,442], [383,424,401], [56,382,88], [64,411,424], [383,384,424], [12,386,418], [12,418,420], [438,72,65], [72,388,65], [72,425,388], [395,340,420], [405,420,340], [434,420,405], [441,389,425], [379,443,380], [392,442,399], [64,424,384], [427,88,402], [426,412,88], [412,56,88], [412,426,38], [64,428,498], [5,91,403], [41,394,414], [6,334,455], [346,437,372], [12,429,386], [434,12,420], [422,434,405], [443,430,380], [88,427,426], [446,431,39], [29,431,446], [446,432,29], [334,447,455], [437,346,433], [442,423,399], [392,351,435], [346,457,433], [334,386,130], [437,438,372], [448,12,439], [439,425,72], [441,425,439], [12,434,440], [12,440,439], [434,441,440], [440,441,439], [441,434,451], [434,422,442], [87,443,441], [392,435,442], [351,430,435], [430,445,435], [86,457,346], [72,438,466], [448,439,72], [453,441,451], [451,434,449], [434,442,449], [430,443,445], [39,394,41], [455,5,6], [105,5,455], [448,72,466], [34,41,414], [452,446,39], [452,39,41], [432,86,37], [29,432,37], [466,438,437], [429,130,386], [458,130,429], [12,448,429], [453,87,441], [442,450,444], [435,450,442], [450,435,445], [443,451,445], [34,414,436], [5,105,436], [105,34,436], [457,86,432], [334,130,447], [459,466,437], [451,443,454], [454,443,87], [444,449,442], [445,451,450], [429,448,456], [429,456,458], [444,451,449], [453,454,87], [451,454,453], [450,451,444], [459,437,433], [446,17,432], [432,17,457], [17,53,457], [457,115,433], [447,105,455], [448,466,456], [446,452,17], [452,53,17], [460,34,105], [464,41,34], [464,452,41], [115,457,53], [105,447,130], [130,458,456], [465,452,464], [463,462,464], [115,459,433], [462,461,464], [466,461,462], [53,465,115], [452,465,53], [460,464,34], [463,464,460], [460,105,463], [105,130,463], [466,462,463], [466,465,461], [461,465,464], [466,463,130], [465,466,459], [115,465,459], [466,130,456], [189,35,469], [176,25,133], [25,204,133], [468,204,25], [77,255,82], [189,109,467], [109,256,467], [109,189,469], [467,479,189], [232,204,470], [62,77,471], [213,62,471], [253,62,472], [253,77,62], [255,77,253], [476,474,81], [476,81,109], [255,119,82], [94,470,204], [232,470,94], [468,94,204], [25,94,468], [94,25,473], [472,62,212], [2,254,203], [254,475,282], [474,475,254], [474,254,2], [474,476,282], [474,282,475], [478,2,203], [255,253,119], [81,474,2], [94,82,262], [94,473,82], [256,109,81], [109,469,481], [469,35,481], [275,254,489], [74,478,203], [471,477,273], [74,256,2], [74,2,478], [477,471,82], [77,82,471], [2,256,81], [119,94,262], [119,262,82], [82,473,293], [479,467,294], [189,473,176], [479,473,189], [303,74,203], [303,203,239], [20,213,471], [20,471,273], [253,472,119], [109,282,476], [477,82,293], [294,256,135], [240,232,283], [119,283,94], [283,232,94], [292,273,477], [256,74,480], [293,473,486], [485,109,481], [263,485,481], [263,481,35], [135,256,484], [256,480,484], [477,293,486], [485,489,282], [472,488,482], [472,283,119], [482,283,472], [292,483,311], [483,292,477], [483,477,311], [482,85,283], [345,135,484], [85,284,283], [74,345,484], [74,484,480], [311,477,486], [263,61,485], [479,486,473], [135,486,479], [61,487,485], [487,489,485], [292,311,491], [482,488,85], [42,74,303], [85,490,86], [488,490,85], [345,486,135], [487,352,489], [352,275,489], [292,491,272], [491,344,272], [74,42,492], [345,74,84], [74,492,84], [491,36,344], [42,385,84], [42,84,492], [311,486,345], [61,352,487], [370,491,311], [488,494,490], [490,494,86], [352,493,383], [383,493,384], [491,393,36], [496,494,488], [345,84,385], [345,385,495], [352,61,365], [370,311,495], [311,345,495], [488,412,496], [90,42,364], [370,495,39], [352,69,493], [86,494,415], [494,496,415], [352,365,6], [352,6,69], [498,364,64], [38,496,412], [491,370,431], [370,39,431], [493,69,384], [498,90,364], [491,431,393], [393,497,117], [431,497,393], [413,385,90], [394,385,413], [394,413,414], [497,29,117], [496,38,415], [499,69,6], [403,69,499], [403,499,6], [384,69,428], [64,384,428], [18,427,500], [427,18,38], [427,38,426], [427,117,500], [38,501,415], [18,501,38], [69,40,428], [413,90,498], [40,69,403], [40,403,91], [117,29,500], [29,18,500], [18,29,501], [431,29,497], [413,40,91], [413,91,414], [37,501,29], [415,501,37], [91,436,414], [5,436,91], [428,40,498], [40,413,498]]
);
